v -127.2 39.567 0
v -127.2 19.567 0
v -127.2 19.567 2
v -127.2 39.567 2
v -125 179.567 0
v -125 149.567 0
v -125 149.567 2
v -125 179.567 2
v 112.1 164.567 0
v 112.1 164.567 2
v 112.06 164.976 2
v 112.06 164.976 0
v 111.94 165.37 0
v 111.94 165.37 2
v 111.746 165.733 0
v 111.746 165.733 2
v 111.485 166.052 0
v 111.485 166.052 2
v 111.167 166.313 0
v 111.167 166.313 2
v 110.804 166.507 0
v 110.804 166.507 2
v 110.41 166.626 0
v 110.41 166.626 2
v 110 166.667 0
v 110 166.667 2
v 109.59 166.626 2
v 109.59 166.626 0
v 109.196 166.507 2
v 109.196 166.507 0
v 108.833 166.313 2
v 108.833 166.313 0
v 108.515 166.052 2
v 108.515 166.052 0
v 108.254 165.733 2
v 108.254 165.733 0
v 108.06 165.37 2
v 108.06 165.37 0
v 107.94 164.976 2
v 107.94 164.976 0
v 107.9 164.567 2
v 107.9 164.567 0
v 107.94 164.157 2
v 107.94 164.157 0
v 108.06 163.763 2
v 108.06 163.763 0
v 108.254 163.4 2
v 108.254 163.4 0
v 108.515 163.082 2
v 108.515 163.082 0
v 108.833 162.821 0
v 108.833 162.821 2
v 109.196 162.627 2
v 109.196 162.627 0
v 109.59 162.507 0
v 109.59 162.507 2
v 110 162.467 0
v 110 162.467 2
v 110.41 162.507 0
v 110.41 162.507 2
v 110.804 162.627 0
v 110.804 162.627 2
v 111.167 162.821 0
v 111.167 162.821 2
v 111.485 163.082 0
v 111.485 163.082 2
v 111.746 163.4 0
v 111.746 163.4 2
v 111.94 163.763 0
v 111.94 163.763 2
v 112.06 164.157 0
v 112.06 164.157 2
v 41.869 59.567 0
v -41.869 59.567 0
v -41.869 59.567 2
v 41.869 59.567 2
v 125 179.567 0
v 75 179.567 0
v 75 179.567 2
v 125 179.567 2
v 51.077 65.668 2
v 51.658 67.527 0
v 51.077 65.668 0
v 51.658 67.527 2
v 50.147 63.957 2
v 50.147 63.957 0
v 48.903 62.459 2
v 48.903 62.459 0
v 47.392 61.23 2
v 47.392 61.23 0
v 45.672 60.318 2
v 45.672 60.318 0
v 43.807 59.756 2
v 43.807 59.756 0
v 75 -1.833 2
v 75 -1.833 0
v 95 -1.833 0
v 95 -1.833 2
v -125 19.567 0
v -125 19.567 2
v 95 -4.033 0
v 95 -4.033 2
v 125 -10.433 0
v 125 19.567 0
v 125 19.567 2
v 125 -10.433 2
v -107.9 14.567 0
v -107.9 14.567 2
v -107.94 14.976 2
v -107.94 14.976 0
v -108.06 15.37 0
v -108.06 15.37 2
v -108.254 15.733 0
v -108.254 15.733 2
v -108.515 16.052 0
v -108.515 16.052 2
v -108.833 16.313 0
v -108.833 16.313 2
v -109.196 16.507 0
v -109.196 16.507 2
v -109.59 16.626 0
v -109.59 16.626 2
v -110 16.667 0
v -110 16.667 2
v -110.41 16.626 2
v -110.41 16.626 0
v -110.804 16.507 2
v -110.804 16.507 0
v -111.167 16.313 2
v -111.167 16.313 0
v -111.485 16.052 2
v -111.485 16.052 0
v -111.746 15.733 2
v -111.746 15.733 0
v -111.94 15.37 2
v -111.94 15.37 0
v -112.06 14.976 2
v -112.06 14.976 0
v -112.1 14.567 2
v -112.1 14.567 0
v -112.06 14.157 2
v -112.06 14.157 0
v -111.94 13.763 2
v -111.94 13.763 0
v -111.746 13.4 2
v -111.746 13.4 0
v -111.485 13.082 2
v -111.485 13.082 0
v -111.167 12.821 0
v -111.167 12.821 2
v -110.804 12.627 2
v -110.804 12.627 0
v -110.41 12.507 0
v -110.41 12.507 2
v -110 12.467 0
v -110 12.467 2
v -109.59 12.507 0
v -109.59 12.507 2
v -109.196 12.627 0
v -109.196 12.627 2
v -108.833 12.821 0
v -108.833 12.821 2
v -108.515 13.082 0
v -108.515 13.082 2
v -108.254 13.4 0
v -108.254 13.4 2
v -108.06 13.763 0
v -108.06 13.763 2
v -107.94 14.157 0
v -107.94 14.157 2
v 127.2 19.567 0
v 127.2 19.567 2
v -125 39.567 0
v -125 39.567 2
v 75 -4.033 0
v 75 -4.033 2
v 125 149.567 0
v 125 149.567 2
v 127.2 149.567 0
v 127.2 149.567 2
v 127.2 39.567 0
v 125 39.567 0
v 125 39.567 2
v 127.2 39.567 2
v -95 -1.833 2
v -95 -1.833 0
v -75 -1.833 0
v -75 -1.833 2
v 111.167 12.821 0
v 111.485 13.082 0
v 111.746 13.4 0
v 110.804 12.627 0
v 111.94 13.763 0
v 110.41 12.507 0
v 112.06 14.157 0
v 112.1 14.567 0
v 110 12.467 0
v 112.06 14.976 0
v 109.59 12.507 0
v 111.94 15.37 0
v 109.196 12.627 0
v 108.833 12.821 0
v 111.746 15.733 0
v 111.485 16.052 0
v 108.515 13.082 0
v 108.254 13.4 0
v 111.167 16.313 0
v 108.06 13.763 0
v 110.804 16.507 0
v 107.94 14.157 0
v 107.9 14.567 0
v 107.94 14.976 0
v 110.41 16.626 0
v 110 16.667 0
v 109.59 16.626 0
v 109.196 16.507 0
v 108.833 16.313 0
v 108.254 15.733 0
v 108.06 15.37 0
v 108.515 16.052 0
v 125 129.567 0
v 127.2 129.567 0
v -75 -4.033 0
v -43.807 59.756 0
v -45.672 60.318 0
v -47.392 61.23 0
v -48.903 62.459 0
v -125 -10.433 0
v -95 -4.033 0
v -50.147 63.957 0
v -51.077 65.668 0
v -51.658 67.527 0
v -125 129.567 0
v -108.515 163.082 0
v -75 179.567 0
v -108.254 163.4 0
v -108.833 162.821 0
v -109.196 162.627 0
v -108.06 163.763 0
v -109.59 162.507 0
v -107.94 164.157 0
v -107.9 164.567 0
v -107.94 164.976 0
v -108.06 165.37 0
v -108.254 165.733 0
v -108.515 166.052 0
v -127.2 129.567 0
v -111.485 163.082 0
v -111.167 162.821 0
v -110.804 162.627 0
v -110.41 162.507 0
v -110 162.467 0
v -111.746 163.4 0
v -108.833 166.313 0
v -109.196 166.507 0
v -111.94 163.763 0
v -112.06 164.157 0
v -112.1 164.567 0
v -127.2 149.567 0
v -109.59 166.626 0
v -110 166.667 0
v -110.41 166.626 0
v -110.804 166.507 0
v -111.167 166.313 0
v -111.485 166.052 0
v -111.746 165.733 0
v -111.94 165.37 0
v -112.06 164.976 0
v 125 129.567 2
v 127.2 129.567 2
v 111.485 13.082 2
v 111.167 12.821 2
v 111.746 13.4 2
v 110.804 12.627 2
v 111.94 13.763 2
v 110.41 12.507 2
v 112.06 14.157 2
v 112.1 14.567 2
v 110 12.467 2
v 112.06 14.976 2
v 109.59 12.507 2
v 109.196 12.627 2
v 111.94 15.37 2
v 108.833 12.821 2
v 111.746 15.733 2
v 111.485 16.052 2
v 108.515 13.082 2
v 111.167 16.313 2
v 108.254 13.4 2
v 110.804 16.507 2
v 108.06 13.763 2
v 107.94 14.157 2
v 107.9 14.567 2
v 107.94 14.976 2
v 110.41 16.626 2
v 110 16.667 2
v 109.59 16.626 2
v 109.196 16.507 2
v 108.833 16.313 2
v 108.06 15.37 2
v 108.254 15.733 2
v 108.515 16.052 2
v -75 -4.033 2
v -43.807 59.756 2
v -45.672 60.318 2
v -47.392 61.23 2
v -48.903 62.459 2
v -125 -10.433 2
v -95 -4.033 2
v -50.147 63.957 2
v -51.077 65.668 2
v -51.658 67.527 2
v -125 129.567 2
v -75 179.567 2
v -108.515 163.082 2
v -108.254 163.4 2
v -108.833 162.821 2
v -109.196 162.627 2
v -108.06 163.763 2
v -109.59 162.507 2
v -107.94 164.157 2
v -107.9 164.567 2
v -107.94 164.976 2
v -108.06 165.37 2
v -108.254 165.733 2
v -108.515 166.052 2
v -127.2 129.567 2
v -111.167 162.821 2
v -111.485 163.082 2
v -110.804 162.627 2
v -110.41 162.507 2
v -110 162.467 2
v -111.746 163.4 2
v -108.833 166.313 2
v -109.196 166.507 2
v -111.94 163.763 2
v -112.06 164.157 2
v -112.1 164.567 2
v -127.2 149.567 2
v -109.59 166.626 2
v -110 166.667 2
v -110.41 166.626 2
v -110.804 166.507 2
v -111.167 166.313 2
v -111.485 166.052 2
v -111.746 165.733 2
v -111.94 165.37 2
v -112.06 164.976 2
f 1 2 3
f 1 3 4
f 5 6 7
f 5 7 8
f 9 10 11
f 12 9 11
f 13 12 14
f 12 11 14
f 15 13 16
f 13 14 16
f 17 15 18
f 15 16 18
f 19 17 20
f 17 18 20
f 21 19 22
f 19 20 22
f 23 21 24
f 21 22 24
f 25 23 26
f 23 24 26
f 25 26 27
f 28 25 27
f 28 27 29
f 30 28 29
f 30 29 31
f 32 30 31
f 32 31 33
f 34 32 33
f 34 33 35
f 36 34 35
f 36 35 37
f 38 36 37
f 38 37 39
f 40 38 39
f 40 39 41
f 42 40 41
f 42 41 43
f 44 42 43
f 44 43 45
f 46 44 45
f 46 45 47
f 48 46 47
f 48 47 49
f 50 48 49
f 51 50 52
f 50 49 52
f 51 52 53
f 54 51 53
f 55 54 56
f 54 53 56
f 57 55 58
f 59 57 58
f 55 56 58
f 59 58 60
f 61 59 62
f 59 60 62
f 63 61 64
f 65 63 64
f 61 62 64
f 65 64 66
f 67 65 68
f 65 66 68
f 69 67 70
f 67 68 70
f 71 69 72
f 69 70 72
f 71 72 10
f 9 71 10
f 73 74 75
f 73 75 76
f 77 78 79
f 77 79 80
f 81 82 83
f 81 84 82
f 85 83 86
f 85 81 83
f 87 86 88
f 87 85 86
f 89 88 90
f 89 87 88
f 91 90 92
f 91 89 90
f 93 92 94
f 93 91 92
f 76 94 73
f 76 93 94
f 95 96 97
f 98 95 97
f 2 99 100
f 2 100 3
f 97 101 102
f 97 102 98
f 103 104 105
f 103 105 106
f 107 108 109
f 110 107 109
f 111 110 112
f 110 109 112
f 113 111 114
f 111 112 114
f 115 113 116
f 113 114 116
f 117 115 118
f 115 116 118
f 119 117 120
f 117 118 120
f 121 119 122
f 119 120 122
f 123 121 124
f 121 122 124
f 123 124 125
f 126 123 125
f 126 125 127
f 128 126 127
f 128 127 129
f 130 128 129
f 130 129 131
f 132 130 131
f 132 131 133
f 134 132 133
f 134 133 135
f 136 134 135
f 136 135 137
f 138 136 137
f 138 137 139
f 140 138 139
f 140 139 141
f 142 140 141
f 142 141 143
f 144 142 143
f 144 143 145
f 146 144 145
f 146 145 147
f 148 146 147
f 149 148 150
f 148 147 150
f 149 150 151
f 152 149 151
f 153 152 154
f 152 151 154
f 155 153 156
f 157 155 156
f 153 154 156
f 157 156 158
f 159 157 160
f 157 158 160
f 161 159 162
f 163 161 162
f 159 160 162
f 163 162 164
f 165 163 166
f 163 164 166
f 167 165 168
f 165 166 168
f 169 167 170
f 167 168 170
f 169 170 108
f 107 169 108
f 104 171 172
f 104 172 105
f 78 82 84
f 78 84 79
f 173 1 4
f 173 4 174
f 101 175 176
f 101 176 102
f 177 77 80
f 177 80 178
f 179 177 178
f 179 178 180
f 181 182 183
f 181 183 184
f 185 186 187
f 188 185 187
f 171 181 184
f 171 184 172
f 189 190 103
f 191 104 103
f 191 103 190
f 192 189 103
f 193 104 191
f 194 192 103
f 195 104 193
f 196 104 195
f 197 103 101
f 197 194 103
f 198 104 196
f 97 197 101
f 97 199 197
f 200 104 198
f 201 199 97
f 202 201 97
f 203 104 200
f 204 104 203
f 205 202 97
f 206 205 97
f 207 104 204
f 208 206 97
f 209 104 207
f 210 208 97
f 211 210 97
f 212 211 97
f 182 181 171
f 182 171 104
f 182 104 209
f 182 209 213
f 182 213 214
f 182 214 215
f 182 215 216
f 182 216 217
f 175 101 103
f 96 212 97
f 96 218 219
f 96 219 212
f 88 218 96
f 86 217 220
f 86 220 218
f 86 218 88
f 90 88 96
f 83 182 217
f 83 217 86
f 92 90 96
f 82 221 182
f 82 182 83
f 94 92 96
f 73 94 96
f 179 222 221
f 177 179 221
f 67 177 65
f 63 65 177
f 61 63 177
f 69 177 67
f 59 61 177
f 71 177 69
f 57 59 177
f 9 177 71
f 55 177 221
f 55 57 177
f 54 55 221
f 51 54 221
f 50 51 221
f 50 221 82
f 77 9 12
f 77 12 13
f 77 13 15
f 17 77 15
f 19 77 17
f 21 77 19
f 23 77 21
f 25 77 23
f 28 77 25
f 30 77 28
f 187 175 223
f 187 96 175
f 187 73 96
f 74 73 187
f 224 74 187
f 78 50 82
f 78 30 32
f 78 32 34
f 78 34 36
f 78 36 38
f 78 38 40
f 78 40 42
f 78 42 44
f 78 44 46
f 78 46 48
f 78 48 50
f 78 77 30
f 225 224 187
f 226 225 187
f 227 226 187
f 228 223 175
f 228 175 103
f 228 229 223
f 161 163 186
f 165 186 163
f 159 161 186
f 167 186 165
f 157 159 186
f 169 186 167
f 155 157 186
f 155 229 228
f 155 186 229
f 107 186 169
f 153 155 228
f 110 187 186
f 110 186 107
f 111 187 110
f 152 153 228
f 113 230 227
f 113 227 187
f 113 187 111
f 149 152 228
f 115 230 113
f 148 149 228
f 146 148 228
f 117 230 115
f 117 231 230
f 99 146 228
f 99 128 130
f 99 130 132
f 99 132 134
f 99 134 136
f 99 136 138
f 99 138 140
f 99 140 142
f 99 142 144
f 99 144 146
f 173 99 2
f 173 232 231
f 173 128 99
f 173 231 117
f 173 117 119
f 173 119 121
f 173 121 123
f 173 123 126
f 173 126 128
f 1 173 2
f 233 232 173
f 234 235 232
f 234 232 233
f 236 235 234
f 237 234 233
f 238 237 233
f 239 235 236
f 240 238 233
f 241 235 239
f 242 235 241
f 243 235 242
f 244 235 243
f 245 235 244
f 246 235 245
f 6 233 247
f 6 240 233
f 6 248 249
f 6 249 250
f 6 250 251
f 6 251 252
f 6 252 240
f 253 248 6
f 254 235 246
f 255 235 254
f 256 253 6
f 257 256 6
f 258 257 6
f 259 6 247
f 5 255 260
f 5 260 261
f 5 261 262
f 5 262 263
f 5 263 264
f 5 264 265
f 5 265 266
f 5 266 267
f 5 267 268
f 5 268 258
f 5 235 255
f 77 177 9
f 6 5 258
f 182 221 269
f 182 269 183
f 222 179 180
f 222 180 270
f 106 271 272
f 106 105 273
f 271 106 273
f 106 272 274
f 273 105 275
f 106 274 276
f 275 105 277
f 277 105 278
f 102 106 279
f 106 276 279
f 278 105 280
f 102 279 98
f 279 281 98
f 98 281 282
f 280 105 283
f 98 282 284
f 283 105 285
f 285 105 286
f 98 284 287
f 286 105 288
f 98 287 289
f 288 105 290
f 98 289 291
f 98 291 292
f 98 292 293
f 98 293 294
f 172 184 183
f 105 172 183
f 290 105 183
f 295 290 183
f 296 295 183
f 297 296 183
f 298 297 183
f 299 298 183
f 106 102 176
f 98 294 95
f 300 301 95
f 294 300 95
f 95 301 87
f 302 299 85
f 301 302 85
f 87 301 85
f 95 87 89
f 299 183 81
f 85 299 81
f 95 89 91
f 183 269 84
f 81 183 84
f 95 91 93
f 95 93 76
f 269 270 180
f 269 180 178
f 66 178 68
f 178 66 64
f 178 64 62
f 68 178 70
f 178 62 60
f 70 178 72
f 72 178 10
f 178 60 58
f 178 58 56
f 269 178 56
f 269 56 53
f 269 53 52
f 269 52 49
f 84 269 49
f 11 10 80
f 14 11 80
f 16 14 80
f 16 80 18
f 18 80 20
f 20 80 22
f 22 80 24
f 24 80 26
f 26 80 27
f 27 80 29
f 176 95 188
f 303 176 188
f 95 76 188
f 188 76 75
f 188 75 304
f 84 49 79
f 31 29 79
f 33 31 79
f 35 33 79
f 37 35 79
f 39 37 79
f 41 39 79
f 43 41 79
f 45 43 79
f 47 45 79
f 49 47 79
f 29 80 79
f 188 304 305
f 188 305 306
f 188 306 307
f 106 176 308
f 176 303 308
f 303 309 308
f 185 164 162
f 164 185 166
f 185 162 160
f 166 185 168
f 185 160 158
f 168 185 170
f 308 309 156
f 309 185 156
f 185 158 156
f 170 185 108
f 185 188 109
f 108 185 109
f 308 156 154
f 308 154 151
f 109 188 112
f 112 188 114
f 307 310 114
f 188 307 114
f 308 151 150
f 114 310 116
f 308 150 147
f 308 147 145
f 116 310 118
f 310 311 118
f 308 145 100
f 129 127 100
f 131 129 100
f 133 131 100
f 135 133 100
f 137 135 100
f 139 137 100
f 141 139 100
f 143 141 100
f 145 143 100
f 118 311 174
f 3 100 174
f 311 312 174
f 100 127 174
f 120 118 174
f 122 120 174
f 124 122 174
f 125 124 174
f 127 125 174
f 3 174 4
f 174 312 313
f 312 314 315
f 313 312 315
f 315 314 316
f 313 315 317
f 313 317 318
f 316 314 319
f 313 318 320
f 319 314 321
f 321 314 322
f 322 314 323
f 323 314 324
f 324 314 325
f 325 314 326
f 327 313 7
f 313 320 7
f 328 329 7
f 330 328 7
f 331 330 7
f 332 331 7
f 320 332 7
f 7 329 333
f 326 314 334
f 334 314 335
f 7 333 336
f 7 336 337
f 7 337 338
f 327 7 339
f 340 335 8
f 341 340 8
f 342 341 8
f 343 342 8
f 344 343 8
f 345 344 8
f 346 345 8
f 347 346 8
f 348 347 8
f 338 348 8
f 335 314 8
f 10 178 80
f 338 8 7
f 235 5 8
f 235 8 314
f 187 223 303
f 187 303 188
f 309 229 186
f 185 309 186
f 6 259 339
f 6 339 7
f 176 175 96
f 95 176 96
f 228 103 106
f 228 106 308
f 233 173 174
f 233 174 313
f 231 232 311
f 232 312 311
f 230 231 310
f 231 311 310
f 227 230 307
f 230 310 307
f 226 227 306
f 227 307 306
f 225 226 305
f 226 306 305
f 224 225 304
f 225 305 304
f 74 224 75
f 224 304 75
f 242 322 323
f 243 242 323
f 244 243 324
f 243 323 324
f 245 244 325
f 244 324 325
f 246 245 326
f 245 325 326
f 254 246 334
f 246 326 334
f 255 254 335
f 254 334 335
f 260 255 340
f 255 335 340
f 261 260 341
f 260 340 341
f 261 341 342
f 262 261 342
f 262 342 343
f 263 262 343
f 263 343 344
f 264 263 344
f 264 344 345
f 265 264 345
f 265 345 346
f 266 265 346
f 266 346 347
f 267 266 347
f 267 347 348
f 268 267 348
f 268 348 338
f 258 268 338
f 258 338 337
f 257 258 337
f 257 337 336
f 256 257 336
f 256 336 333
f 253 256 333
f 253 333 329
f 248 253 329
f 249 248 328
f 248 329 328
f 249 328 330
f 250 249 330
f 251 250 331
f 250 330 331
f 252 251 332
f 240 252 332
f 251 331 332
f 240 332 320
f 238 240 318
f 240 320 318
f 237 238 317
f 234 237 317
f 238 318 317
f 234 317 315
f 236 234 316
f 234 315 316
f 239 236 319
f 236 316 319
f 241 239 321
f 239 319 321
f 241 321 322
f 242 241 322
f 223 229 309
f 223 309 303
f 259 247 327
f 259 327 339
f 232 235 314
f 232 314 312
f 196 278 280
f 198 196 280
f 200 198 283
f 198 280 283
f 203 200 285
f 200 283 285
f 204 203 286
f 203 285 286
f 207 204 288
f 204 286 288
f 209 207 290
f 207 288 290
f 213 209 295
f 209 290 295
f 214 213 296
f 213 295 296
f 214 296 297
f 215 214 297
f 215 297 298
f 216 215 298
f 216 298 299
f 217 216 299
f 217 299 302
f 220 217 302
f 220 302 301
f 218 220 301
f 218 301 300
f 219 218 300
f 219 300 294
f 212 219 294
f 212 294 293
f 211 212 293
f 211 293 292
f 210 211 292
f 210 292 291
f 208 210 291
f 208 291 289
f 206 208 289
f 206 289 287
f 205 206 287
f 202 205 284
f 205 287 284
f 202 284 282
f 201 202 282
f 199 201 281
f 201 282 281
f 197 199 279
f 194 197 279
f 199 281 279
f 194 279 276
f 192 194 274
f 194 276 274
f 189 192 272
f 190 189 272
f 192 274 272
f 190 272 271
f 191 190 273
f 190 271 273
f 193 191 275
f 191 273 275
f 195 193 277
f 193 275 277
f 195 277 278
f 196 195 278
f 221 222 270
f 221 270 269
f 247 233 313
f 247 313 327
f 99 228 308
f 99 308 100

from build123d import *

# Parameters (mm, degrees)
SKETCH1_W           = 20
SKETCH1_H           = 2.2
BOSS_EXTRUDE1_DEPTH = 2
FILLET1_R           = 10
SKETCH2_R           = 2.1
CUT_EXTRUDE1_DEPTH  = 5


with BuildPart() as part:
    # Sketch1 → Boss-Extrude1 (new body)
    with BuildSketch(Plane.XY):
        Polygon((125.000000001, -10.433333333), (-124.999999999, -10.433333333), (-124.999999999, 19.566666667), (-127.199999999, 19.566666667), (-127.199999999, 39.566666667), (-124.999999999, 39.566666667), (-124.999999999, 129.566666667), (-127.199999999, 129.566666667), (-127.199999999, 149.566666667), (-124.999999999, 149.566666667), (-124.999999999, 179.566666667), (-74.999999999, 179.566666667), (-50, 59.566666667), (50, 59.566666667), (75.000000001, 179.566666667), (125.000000001, 179.566666667), (125.000000001, 149.566666667), (127.200000001, 149.566666667), (127.200000001, 129.566666667), (125.000000001, 129.566666667), (125.000000001, 39.566666667), (127.200000001, 39.566666667), (127.200000001, 19.566666667), (125.000000001, 19.566666667), align=None)
        with Locations((85.000000001, -2.933333333)):
            Rectangle(SKETCH1_W, SKETCH1_H, mode=Mode.SUBTRACT)
        with Locations((-84.999999999, -2.933333333)):
            Rectangle(SKETCH1_W, SKETCH1_H, mode=Mode.SUBTRACT)
    extrude(amount=BOSS_EXTRUDE1_DEPTH)

    # Fillet1
    fillet1_edges = [part.edges().sort_by_distance(p)[0] for p in [
        (-50, 59.566666667, 1),
        (50, 59.566666667, 1),
    ]]
    fillet(fillet1_edges, radius=FILLET1_R)

    # Sketch2 → Cut-Extrude1 (cut)
    with BuildSketch(Plane.XY.offset(2)):
        with Locations((-109.999999999, 14.566666667)):
            Circle(SKETCH2_R)
        with Locations((110.000000001, 14.566666667)):
            Circle(SKETCH2_R)
        with Locations((110.000000001, 164.566666667)):
            Circle(SKETCH2_R)
        with Locations((-109.999999999, 164.566666667)):
            Circle(SKETCH2_R)
    extrude(amount=-CUT_EXTRUDE1_DEPTH, mode=Mode.SUBTRACT)


solid = part.part
